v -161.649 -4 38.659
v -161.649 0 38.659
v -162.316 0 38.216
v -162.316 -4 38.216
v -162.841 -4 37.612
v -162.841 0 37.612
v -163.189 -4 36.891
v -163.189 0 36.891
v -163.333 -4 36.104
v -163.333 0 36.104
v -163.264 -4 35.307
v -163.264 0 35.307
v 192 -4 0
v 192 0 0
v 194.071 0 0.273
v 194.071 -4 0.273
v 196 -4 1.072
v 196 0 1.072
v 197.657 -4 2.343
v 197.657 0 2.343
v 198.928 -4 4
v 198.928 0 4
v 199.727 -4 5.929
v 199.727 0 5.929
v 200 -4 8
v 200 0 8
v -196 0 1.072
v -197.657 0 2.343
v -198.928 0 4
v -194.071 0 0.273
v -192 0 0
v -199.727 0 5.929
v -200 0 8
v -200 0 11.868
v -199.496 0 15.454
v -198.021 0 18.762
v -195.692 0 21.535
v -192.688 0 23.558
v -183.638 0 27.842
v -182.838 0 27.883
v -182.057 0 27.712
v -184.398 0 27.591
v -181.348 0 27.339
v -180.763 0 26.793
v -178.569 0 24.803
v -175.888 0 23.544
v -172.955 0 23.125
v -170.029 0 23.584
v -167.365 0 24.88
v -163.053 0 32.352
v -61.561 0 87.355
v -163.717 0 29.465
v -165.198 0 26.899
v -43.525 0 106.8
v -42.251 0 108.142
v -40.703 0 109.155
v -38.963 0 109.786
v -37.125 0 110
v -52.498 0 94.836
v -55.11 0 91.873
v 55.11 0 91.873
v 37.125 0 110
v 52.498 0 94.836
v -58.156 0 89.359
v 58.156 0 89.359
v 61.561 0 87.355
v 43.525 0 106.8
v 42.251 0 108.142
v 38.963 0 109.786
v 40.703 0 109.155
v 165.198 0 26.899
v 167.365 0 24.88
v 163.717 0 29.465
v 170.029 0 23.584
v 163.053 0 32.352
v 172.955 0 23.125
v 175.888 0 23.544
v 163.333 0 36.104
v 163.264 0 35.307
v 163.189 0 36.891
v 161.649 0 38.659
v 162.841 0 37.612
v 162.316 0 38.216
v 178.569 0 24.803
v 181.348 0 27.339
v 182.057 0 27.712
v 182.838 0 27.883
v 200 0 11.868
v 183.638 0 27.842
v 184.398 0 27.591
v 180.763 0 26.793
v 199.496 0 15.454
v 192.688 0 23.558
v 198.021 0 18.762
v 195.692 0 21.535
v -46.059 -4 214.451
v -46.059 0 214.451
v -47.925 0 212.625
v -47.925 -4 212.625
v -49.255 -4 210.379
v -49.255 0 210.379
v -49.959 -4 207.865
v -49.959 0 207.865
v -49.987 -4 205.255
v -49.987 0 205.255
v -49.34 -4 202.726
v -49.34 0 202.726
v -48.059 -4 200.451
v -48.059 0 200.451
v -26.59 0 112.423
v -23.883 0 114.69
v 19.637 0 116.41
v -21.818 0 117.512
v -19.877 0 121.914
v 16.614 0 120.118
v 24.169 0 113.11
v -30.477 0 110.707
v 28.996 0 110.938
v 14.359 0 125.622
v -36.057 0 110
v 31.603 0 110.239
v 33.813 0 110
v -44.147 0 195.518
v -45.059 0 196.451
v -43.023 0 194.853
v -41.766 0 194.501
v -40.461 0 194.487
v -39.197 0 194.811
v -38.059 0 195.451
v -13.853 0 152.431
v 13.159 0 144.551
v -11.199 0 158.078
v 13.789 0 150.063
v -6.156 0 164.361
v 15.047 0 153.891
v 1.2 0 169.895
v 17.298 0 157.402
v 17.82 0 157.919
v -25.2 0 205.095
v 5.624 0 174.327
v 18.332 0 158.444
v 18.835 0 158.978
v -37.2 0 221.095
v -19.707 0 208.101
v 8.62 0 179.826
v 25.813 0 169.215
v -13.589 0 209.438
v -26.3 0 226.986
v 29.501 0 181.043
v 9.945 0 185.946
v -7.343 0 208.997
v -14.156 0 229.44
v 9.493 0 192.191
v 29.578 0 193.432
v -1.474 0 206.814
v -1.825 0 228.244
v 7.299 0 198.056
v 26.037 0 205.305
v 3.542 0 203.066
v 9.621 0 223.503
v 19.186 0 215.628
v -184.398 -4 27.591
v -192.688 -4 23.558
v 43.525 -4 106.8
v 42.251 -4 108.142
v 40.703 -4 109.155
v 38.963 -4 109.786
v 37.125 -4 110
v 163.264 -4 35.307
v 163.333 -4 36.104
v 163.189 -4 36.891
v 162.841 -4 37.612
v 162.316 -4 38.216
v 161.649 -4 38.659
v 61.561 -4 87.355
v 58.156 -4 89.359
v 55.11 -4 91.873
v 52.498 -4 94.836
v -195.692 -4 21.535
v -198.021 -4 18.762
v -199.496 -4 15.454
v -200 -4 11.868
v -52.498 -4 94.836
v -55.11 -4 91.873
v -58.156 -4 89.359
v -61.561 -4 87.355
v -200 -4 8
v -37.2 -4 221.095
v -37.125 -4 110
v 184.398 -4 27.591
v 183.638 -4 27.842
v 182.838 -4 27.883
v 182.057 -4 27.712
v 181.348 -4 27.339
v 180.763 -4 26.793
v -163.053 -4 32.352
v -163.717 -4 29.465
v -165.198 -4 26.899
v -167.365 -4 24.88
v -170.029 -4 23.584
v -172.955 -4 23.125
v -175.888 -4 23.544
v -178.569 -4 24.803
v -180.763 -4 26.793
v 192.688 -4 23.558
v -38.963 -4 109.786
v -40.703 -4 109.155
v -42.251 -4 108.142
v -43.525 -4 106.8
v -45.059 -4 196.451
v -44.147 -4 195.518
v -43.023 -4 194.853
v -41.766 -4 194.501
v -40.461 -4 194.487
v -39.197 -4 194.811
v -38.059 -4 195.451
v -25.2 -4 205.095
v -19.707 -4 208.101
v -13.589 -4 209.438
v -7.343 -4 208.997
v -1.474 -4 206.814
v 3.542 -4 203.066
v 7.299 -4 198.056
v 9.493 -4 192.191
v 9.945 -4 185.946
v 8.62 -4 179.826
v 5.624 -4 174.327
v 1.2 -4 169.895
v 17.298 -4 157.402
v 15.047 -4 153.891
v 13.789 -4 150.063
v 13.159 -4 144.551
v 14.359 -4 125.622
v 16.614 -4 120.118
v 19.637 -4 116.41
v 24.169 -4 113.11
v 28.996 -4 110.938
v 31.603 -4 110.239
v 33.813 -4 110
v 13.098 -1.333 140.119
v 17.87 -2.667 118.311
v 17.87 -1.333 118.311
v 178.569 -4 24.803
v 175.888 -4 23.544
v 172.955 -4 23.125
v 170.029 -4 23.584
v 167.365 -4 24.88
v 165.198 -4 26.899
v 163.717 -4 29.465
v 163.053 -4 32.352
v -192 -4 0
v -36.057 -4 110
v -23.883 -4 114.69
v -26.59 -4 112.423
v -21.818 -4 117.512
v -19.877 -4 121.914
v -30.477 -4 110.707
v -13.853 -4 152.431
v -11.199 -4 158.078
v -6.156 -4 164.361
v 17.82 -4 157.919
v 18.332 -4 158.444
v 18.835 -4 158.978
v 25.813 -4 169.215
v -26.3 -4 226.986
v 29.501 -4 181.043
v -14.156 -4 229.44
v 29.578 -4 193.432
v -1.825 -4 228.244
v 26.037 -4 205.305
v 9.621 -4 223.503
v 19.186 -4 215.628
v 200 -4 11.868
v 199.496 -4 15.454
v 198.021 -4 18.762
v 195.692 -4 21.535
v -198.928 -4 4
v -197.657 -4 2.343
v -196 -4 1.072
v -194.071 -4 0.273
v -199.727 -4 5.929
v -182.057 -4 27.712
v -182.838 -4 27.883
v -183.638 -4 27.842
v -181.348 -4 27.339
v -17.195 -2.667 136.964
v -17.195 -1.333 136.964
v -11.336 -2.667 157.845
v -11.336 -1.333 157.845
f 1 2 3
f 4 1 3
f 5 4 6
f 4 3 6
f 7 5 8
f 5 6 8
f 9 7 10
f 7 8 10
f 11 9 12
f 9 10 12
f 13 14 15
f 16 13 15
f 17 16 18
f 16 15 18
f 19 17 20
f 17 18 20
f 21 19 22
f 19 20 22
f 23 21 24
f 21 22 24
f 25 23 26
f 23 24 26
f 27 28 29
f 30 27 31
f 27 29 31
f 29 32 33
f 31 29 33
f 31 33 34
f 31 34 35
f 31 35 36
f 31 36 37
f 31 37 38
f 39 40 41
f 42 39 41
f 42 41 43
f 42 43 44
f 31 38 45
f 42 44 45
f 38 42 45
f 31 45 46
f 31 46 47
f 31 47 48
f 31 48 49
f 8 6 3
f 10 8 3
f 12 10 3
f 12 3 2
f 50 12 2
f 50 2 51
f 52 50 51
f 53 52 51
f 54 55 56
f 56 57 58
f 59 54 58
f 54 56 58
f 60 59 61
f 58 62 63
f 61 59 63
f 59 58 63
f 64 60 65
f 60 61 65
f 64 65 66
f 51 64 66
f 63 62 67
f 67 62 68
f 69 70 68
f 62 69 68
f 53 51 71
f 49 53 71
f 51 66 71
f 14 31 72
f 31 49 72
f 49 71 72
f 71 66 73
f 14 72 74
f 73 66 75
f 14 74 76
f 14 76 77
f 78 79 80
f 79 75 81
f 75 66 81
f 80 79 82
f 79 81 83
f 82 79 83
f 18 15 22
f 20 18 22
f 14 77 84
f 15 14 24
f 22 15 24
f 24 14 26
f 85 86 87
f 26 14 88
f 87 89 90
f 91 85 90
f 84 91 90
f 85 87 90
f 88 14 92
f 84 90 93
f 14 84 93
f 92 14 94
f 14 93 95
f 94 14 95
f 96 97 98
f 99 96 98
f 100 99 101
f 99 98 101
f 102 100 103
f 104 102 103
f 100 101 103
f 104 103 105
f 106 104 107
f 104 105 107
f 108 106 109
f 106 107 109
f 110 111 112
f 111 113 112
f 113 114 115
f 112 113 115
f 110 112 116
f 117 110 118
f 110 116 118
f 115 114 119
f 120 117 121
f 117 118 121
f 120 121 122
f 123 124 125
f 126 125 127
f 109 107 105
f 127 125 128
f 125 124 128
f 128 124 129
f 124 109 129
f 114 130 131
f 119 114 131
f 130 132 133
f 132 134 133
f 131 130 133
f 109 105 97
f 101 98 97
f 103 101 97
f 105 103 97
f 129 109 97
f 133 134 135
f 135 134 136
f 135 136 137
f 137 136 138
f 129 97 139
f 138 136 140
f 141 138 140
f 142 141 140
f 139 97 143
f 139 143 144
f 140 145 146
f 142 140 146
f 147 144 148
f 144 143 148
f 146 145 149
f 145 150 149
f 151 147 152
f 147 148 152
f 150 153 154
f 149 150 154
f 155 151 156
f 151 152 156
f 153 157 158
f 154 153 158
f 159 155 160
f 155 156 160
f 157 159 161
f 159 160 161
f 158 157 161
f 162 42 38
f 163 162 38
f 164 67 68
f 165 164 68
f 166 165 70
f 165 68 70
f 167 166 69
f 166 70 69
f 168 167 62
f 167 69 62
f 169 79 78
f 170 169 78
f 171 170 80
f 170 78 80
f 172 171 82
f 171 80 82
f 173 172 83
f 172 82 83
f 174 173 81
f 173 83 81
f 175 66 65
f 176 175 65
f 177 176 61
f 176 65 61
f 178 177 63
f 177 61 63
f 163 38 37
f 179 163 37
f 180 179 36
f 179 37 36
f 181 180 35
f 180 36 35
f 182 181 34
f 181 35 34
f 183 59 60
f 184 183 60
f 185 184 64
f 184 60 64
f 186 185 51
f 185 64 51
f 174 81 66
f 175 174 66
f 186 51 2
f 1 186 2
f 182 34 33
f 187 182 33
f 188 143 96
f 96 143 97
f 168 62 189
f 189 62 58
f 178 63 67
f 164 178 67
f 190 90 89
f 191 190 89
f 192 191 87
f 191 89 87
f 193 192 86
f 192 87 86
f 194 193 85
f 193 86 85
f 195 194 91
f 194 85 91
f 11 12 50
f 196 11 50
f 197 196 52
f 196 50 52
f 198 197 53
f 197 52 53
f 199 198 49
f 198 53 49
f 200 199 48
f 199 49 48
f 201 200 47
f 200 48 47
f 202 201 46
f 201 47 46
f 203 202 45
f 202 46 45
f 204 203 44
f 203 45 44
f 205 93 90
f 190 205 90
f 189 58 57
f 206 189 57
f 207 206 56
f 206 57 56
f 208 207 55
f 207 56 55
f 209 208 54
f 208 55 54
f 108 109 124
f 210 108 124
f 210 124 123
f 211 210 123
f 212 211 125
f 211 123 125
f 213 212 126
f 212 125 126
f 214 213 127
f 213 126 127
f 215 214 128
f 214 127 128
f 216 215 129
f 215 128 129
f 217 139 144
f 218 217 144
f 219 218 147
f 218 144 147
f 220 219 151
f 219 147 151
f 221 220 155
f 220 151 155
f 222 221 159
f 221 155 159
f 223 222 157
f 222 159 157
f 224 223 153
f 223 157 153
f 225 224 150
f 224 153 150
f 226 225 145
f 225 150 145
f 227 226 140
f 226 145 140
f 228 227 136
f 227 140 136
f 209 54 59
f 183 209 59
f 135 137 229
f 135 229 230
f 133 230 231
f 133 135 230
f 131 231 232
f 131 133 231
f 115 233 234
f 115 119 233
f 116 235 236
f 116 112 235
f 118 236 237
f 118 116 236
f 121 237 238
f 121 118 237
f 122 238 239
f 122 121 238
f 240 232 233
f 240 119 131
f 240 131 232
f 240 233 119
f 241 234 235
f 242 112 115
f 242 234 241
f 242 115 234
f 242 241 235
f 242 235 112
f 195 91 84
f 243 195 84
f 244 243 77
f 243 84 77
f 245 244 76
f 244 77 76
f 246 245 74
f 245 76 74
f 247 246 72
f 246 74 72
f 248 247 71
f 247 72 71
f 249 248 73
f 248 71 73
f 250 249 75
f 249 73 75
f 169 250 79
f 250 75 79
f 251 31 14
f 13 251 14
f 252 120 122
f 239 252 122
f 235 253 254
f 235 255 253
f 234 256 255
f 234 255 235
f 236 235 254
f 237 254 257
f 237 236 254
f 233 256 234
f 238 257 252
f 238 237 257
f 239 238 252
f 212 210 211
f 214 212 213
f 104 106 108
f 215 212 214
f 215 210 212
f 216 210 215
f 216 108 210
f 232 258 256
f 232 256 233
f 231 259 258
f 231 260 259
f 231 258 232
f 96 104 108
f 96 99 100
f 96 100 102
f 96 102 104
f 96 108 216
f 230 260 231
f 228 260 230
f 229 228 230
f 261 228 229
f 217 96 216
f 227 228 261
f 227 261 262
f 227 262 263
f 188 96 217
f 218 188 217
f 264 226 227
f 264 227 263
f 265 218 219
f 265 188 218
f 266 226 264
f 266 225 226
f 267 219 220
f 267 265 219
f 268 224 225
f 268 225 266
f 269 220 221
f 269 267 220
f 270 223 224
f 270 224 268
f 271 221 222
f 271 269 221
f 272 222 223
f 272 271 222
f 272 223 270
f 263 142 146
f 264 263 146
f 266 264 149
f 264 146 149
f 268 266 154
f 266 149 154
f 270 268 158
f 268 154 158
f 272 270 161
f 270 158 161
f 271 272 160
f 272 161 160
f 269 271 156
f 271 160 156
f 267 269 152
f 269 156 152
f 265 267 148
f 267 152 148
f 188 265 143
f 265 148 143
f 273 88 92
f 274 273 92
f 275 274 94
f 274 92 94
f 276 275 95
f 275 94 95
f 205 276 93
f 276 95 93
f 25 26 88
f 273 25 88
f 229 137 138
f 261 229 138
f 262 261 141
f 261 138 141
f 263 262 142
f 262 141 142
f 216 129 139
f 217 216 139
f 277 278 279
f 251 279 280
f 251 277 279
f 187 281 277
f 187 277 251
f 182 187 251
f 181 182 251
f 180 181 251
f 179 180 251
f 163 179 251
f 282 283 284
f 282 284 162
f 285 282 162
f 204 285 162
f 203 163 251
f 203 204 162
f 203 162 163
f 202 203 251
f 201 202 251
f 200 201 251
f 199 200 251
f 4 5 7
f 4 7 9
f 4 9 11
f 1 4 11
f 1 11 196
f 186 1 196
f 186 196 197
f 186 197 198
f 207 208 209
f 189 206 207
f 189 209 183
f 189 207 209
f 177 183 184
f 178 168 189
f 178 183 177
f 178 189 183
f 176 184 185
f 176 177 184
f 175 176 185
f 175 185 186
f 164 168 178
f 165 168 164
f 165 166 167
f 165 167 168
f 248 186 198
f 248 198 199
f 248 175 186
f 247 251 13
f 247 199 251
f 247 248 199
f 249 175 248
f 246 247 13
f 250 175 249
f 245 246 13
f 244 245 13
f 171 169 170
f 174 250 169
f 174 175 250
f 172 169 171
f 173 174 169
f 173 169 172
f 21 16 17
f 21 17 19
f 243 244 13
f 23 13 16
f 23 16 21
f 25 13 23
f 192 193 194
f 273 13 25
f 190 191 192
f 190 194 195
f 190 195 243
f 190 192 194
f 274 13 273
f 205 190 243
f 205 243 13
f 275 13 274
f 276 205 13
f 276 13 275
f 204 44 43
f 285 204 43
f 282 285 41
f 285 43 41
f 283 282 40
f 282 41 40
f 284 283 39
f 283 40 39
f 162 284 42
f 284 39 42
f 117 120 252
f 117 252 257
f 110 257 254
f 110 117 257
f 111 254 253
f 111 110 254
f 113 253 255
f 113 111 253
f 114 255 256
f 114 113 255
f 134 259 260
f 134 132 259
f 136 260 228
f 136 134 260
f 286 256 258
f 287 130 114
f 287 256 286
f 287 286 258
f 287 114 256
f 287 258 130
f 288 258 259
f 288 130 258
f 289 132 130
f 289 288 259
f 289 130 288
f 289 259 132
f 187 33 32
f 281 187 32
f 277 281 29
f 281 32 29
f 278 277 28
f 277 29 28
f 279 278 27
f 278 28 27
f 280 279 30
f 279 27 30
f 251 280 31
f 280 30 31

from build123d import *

# Parameters (mm, degrees)
F2_DEPTH = 4


with BuildPart() as f2:
    # F1 (on Front) → F2 (new body)
    with BuildSketch(Plane.XZ):
        with BuildLine():
            ThreePointArc((18.8345826463, 158.9782924416), (19.1860958712, 215.6277740938), (-37.2, 221.0954541697))
            Line((-37.2, 221.0954541697), (-46.0592777571, 214.4509958519))
            ThreePointArc((-46.0592777571, 214.4509958519), (-49.9587726937, 207.8652094143), (-48.0592777571, 200.4509958519))
            Line((-48.0592777571, 200.4509958519), (-45.0592777571, 196.4509958519))
            ThreePointArc((-45.0592777571, 196.4509958519), (-41.7663845383, 194.5012483836), (-38.0592777571, 195.4509958519))
            Line((-38.0592777571, 195.4509958519), (-25.2, 205.0954541697))
            ThreePointArc((-25.2, 205.0954541697), (5.6, 200.6954541697), (1.2, 169.8954541697))
            ThreePointArc((1.2, 169.8954541697), (-5.571825393, 161.7813668662), (-8, 151.4954541697))
            Line((-8, 151.4954541697), (-8, 110))
            Line((-8, 110), (0, 110))
            Line((0, 110), (12, 110))
            Line((12, 110), (12, 151.4954541697))
            ThreePointArc((12, 151.4954541697), (12.316718427, 152.8370949562), (13.2, 153.8954541697))
            ThreePointArc((13.2, 153.8954541697), (15.3055154559, 155.5829358472), (17.2983292582, 157.4021342685))
            add(Edge.make_bspline(
                [(18.8345826463, 158.9782924416), (18.2685657224, 158.4677005018), (17.7583091445, 157.9420185701), (17.2983292582, 157.4021342685)],
                knots=[0, 0, 0, 0, 0.0332714109, 0.0332714109, 0.0332714109, 0.0332714109], degree=3))
        make_face()
        with BuildLine():
            ThreePointArc((17.2983292582, 157.4021342685), (18.0767824439, 158.180148307), (18.8345826463, 158.9782924416))
            add(Edge.make_bspline(
                [(18.8345826463, 158.9782924416), (18.2685657224, 158.4677005018), (17.7583091445, 157.9420185701), (17.2983292582, 157.4021342685)],
                knots=[0, 0, 0, 0, 0.0332714109, 0.0332714109, 0.0332714109, 0.0332714109], degree=3))
        make_face()
        with BuildLine():
            add(Edge.make_bspline(
                [(17.2983292582, 157.4021342685), (13.1793035086, 152.5675808311), (12.9884623094, 139.527426253), (13.3703276725, 116.5931182655), (29.7821242027, 110), (33.8129806474, 110)],
                knots=[0.0332714109, 0.0332714109, 0.0332714109, 0.0332714109, 0.3312100872, 0.6836806519, 1, 1, 1, 1], degree=3))
            ThreePointArc((17.2983292582, 157.4021342685), (15.3055154559, 155.5829358472), (13.2, 153.8954541697))
            ThreePointArc((13.2, 153.8954541697), (12.316718427, 152.8370949562), (12, 151.4954541697))
            Line((12, 151.4954541697), (12, 110))
            Line((12, 110), (33.8129806474, 110))
        make_face()
        with BuildLine():
            ThreePointArc((-8, 151.4954541697), (-5.571825393, 161.7813668662), (1.2, 169.8954541697))
            add(Edge.make_bspline(
                [(-36.0568419915, 110), (-19.4195834096, 110), (-18.0177646467, 138.2709232819), (-12.939977235, 158.3678372994), (-4.7115848759, 166.2572265506), (1.2, 169.8954541697)],
                knots=[0, 0, 0, 0, 0.3938915377, 0.7136667849, 1, 1, 1, 1], degree=3))
            Line((-36.0568419915, 110), (-8, 110))
            Line((-8, 110), (-8, 151.4954541697))
        make_face()
    extrude(amount=F2_DEPTH)


with BuildPart() as f2b:
    # F0 (on Front) → F2, piece 2 (new body)
    with BuildSketch(Plane.XZ):
        with BuildLine():
            Line((-192, 0), (0, 0))
            Line((0, 0), (192, 0))
            ThreePointArc((192, 0), (197.6568542495, 2.3431457505), (200, 8))
            Line((200, 8), (200, 11.8679378518))
            ThreePointArc((200, 11.8679378518), (198.0212862226, 18.7622289683), (192.6875, 23.5577771898))
            Line((192.6875, 23.5577771898), (184.3977608474, 27.5910140947))
            ThreePointArc((184.3977608474, 27.5910140947), (182.4418558034, 27.8235516806), (180.763303963, 26.792968356))
            ThreePointArc((180.763303963, 26.792968356), (168.6484476814, 24.1328158938), (163.2643606305, 35.3067928257))
            ThreePointArc((163.2643606305, 35.3067928257), (163.0392589783, 37.2635675997), (161.6491345153, 38.6589859053))
            Line((161.6491345153, 38.6589859053), (61.5606644749, 87.3553928354))
            ThreePointArc((61.5606644749, 87.3553928354), (56.583657005, 90.5555924183), (52.4981644749, 94.8358531009))
            Line((52.4981644749, 94.8358531009), (43.5250543006, 106.8))
            ThreePointArc((43.5250543006, 106.8), (40.7027630646, 109.155417528), (37.1250543006, 110))
            Line((37.1250543006, 110), (0, 110))
            Line((0, 110), (-37.1250543006, 110))
            ThreePointArc((-37.1250543006, 110), (-40.7027630646, 109.155417528), (-43.5250543006, 106.8))
            Line((-43.5250543006, 106.8), (-52.4981644749, 94.8358531009))
            ThreePointArc((-52.4981644749, 94.8358531009), (-56.583657005, 90.5555924183), (-61.5606644749, 87.3553928354))
            Line((-61.5606644749, 87.3553928354), (-161.6491345153, 38.6589859053))
            ThreePointArc((-161.6491345153, 38.6589859053), (-163.0392589783, 37.2635675997), (-163.2643606305, 35.3067928257))
            ThreePointArc((-163.2643606305, 35.3067928257), (-168.6484476814, 24.1328158938), (-180.763303963, 26.792968356))
            ThreePointArc((-180.763303963, 26.792968356), (-182.4418558034, 27.8235516806), (-184.3977608474, 27.5910140947))
            Line((-184.3977608474, 27.5910140947), (-192.6875, 23.5577771898))
            ThreePointArc((-192.6875, 23.5577771898), (-198.0212862226, 18.7622289683), (-200, 11.8679378518))
            Line((-200, 11.8679378518), (-200, 8))
            ThreePointArc((-200, 8), (-197.6568542495, 2.3431457505), (-192, 0))
        make_face()
    extrude(amount=F2_DEPTH)


solid = Compound([f2.part, f2b.part])
